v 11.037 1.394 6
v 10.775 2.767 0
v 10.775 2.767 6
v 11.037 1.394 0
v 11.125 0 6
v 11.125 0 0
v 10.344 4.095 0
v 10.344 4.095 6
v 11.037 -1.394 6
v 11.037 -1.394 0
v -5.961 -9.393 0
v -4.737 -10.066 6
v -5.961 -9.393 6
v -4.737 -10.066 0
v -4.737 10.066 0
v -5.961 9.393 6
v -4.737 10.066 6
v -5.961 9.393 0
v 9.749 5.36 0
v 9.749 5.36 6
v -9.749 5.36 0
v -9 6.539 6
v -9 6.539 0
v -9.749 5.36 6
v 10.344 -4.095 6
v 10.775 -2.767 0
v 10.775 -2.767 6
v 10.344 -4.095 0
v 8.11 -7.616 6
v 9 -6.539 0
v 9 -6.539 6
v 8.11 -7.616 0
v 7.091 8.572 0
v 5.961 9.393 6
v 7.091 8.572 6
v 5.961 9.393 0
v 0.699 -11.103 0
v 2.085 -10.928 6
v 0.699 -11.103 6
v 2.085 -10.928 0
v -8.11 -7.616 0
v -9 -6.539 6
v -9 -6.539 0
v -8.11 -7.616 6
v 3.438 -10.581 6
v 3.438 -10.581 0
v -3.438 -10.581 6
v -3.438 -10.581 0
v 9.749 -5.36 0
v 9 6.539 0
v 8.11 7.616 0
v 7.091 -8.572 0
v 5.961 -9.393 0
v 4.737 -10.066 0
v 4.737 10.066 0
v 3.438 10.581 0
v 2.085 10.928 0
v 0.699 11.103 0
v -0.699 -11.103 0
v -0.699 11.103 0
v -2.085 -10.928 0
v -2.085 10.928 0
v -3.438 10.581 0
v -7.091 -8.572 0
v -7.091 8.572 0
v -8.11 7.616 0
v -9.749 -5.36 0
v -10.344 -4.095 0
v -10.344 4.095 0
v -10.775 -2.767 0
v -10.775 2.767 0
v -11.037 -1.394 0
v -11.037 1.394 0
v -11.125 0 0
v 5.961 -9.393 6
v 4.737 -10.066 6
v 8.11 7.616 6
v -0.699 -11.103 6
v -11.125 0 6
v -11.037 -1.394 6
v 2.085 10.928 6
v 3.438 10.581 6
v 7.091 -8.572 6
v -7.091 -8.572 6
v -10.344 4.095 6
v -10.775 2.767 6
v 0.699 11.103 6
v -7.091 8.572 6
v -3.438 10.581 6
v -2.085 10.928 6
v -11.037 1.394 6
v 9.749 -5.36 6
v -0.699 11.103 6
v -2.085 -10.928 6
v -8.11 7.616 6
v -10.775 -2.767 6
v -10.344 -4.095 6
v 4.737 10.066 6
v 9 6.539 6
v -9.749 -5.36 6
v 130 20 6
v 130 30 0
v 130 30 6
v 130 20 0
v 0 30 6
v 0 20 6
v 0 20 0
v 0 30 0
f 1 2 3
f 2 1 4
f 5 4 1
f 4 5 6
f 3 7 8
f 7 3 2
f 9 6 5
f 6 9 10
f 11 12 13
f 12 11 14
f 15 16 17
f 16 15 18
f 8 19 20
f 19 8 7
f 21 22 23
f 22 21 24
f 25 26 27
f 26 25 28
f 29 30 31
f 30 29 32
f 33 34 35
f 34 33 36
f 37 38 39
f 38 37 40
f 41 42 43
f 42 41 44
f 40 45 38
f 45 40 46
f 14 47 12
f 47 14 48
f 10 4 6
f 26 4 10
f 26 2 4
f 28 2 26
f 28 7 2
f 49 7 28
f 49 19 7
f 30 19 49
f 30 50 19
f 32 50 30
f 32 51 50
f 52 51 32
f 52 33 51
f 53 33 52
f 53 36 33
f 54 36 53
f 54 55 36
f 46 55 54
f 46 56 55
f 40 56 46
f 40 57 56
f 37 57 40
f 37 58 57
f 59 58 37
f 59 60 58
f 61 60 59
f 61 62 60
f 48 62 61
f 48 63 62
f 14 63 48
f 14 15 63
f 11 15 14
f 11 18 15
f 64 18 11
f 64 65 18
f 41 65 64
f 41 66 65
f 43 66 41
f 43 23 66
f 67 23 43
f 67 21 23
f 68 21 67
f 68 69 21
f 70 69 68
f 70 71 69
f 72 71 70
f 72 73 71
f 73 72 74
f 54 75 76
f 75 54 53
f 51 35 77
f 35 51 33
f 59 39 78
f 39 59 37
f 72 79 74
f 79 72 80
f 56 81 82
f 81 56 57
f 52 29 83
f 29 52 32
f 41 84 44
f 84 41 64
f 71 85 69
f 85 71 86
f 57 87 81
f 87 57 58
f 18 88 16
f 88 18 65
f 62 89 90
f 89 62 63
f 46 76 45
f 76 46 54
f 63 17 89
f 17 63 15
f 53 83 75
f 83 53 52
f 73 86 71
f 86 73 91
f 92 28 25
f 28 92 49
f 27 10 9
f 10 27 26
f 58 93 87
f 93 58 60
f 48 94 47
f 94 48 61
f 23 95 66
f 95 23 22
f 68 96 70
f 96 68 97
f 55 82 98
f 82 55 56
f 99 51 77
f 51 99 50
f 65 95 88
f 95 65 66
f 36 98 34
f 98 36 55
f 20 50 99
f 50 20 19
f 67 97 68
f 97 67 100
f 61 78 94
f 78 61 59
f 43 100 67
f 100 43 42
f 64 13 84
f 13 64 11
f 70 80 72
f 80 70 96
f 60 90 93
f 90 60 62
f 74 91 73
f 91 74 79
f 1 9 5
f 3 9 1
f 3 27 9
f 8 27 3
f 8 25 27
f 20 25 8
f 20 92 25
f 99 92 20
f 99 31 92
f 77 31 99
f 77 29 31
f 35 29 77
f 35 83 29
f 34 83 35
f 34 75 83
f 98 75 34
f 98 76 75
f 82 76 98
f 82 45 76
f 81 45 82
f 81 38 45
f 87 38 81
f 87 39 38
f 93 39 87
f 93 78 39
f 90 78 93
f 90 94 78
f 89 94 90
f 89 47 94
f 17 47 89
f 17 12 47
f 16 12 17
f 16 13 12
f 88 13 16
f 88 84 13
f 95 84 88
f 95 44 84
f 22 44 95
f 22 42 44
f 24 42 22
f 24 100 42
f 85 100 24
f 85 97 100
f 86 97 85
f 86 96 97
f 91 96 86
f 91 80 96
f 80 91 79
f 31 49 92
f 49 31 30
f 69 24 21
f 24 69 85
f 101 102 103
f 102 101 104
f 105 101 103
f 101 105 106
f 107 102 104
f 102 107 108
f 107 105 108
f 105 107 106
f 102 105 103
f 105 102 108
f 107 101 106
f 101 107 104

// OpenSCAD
// Hexagon Nut Table Saw Jig
// Parameters for the jig

// Face to face diameter of hexagon
outer_diameter = 50.8; // 2 inches = 50.8mm
// Diameter of the center hole
inner_hole_diameter = 22.25; // 7/8 inches = 22.225mm, minus 0.3mm = 21.925mm, rounded to 21.9mm 

// Thickness of the base plate
jig_thickness = 10; 
// Height of the dowel pin
dowel_height = 3; 


minkowski_radius = 2;

// Calculated dimensions
jig_diameter = 180;
jig_handle_diameter = 60;
jig_handle_height = 25;

poop = 0.01;

module hexagon_holder_jig() {

    
    // Angled fence for hexagon cutting
    // The fence is positioned to guide the workpiece at the correct angle
    fence_thickness = 30;
    fence_length = 200;
    corner_to_corner = outer_diameter * 1.1547; // cos(30°) = 0.866, so 1/cos(30°) = 1.1547

    difference()
    {
        union()
        {
            // main base circle
            cylinder(h = jig_thickness, d = jig_diameter, $fn = 50);

            // handle
            translate([0, 0, jig_thickness])
            {
                cylinder(h = jig_handle_height, d = jig_handle_diameter, $fn = 50);
                // Add grip holes around the handle
                grip_circle_count = 6;
                grip_circle_radius = 10; // 8mm diameter
                grip_ring_radius = jig_handle_diameter/2 - 5; // slightly inset from edge
                grip_circle_z = jig_handle_height - 4;
                for (i = [0:grip_circle_count-1]) {
                    angle = 360/grip_circle_count * i;
                    x = grip_ring_radius * cos(angle);
                    y = grip_ring_radius * sin(angle);
                    translate([x, y, grip_circle_z])
                        rotate([0,0,0])
                            cylinder(h = 4, d = grip_circle_radius*2, $fn = 30); // through hole
                }
            }
        }


        // Dowel pin
        translate([0, 0, -poop]) 
        {
            cylinder(h = dowel_height+poop, d = inner_hole_diameter, $fn = 50);
        }
        
        // hexagon face length
        face_length = outer_diameter * 1.1547; // cos(30°) = 0.866, so 1/cos(30°) = 1.1547

        
        // Position fence by rotating 120° and translating from dowel center
        // to the corner-to-corner distance at -120° angle
        
        translate([0, 0, -poop])
        {
            intersection()
            {
                    
                        rotate([0, 0, -120])
                            // now translate at a -120 degree angle by corner_to_corner/2
                            translate([corner_to_corner/2, 0,0])
                                rotate([0, 0, -120])
                                    translate([-50,0,0])
                                        cube([130, 10, dowel_height+poop]);

                    
                    cylinder(h = dowel_height, d = jig_diameter, $fn = 50);
            }
        }
    }
    
}

module insets()
{

    cylinder(h = dowel_height*2, d = inner_hole_diameter, $fn = 50);

    translate([0, 20, 0])
        cube([130, 10, dowel_height*2]);

}

// Render the jig
//hexagon_holder_jig();

insets();
